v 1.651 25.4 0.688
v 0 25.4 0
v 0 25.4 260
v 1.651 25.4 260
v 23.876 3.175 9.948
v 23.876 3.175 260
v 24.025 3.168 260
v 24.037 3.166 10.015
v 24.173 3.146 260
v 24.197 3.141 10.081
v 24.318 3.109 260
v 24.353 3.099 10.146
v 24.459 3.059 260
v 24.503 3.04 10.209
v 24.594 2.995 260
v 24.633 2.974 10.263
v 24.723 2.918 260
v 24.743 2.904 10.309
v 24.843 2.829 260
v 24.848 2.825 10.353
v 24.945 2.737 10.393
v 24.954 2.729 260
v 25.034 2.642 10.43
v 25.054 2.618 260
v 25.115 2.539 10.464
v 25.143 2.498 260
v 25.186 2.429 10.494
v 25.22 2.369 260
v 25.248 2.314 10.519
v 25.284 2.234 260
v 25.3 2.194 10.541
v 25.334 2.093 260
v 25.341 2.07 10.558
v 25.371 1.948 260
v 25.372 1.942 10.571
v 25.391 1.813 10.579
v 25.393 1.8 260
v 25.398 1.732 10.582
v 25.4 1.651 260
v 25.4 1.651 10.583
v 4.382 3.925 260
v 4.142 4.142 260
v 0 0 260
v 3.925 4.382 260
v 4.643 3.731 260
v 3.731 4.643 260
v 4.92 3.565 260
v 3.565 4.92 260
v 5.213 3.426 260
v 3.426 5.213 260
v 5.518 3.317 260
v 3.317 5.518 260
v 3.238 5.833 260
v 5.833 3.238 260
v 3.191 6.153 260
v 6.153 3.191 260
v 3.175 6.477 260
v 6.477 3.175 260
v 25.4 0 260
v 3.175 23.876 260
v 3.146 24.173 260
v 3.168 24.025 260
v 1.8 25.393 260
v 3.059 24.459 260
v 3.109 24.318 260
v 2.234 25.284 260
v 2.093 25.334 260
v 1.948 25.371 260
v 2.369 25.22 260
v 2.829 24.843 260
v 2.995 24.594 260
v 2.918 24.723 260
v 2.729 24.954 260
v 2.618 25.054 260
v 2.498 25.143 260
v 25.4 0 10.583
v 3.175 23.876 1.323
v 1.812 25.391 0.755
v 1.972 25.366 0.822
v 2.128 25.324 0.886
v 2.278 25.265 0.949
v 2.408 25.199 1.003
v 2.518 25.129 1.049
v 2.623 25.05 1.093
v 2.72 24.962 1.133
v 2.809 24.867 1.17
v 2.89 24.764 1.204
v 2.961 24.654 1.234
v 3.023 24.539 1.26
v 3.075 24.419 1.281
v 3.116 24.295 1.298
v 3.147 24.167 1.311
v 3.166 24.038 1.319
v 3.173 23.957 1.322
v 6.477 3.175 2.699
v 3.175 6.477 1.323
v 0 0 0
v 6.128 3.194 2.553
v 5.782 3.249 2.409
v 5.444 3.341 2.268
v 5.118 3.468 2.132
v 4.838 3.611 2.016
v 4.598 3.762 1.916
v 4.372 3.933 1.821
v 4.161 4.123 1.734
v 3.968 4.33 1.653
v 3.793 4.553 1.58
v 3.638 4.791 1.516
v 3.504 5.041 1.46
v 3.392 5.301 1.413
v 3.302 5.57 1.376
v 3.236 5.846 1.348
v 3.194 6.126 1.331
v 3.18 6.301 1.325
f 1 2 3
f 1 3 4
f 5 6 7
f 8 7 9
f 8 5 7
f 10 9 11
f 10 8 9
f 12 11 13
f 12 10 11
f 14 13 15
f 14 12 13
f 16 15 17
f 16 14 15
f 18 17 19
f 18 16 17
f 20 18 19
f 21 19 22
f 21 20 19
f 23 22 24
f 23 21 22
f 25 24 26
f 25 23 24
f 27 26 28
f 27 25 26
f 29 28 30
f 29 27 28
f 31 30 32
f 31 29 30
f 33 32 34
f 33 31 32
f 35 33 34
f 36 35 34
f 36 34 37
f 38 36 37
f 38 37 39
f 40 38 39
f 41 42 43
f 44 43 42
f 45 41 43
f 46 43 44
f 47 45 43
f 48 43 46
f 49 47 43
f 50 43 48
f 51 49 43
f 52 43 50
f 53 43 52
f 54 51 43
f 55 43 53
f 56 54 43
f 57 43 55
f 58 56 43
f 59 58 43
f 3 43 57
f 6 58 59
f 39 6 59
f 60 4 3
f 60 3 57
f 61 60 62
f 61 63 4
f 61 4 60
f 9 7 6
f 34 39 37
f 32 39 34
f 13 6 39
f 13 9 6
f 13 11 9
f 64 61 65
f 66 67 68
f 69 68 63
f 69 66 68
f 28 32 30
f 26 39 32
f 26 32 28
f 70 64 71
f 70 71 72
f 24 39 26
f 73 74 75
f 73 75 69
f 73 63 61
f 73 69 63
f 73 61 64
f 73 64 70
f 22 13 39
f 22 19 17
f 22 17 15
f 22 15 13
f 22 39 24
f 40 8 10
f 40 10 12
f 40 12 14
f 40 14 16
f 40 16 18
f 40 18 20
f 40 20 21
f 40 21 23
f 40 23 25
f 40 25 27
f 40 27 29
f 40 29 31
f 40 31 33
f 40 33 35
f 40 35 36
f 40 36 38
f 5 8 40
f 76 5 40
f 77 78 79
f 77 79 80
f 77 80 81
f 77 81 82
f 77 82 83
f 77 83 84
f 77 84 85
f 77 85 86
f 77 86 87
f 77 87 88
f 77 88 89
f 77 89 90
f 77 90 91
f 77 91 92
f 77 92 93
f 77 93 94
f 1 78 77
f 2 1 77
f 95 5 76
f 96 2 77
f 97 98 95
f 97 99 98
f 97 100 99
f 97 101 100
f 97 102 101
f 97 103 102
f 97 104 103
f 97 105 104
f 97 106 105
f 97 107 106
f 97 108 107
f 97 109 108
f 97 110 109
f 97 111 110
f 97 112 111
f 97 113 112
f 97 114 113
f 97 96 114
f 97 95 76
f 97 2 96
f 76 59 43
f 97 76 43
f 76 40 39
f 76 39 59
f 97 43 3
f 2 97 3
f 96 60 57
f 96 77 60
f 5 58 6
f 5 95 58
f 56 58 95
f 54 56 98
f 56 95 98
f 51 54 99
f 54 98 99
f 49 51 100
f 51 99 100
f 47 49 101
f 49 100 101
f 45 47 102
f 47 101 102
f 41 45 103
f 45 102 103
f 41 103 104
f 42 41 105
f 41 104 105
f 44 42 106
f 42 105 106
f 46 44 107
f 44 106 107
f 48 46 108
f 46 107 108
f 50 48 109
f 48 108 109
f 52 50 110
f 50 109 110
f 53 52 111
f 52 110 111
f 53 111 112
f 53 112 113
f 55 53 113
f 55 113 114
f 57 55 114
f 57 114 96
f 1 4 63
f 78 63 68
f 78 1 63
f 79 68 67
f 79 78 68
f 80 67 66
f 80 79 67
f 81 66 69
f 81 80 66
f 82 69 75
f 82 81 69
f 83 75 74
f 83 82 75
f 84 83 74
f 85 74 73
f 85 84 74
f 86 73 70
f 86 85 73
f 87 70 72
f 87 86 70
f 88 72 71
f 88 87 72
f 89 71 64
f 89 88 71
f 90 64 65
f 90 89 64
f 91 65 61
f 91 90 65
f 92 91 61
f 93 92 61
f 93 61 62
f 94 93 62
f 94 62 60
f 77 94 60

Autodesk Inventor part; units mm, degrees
ref_plane "Start Plane" through (0, 0, 0) normal (0, 0, 1) x (1, 0, 0)
ref_plane "End Plane" through (0, 0, 260) normal (0, 0, 1) x (1, 0, 0)
sketch "Sketch" plane through (0, 0, 0) normal (0, 0, 1) x (1, 0, 0)
  line L0 (25.4, 0) -> (0, 0)
  line L1 (0, 0) -> (0, 25.4)
  line L2 (0, 25.4) -> (1.651, 25.4)
  line L3 (3.175, 23.876) -> (3.175, 6.477)
  line L4 (6.477, 3.175) -> (23.876, 3.175)
  line L5 (25.4, 1.651) -> (25.4, 0)
  line L6 (0, -11.0414) -> (0, 31.5385) construction
  line L7 (-11.0414, 0) -> (31.5385, 0) construction
  arc A0 (3.175, 6.477) -> (6.477, 3.175) centre (6.477, 6.477) ccw
  arc A1 (3.175, 23.876) -> (1.651, 25.4) centre (1.651, 23.876) ccw
  arc A2 (25.4, 1.651) -> (23.876, 3.175) centre (23.876, 1.651) ccw
  line L8 (0, 40.0545) -> (0, -19.5574) construction
  line L9 (-19.5574, 0) -> (40.0545, 0) construction
  point P0 (3.175, 25.4)
  point P1 (3.175, 3.175)
  point P2 (25.4, 3.175)
  dimension "d0" = 25.4
  dimension "d1" = 25.4
  dimension "d2" = 3.175
  dimension "d3" = 3.175
  dimension "d10" = 0
  dimension "d11" = 0
  dimension "d14" = 3.302
  dimension "d15" = 1.524
extrude "Body" add sketch "Sketch" along normal up to surface (260 mm away) from surface at 0
sketch "Sketch3" plane through (0, 0, 0) normal (0, 0, 1) x (1, 0, 0)
  line L0 (0, 0) -> (10, 0)
ref_plane "Work Plane3" through (0, 0, 0) normal (0, -1, 0) x (1, 0, 0)
ref_plane "Work Plane6" through (0, 1060, 0) normal (0.3846, 0, -0.9231) x (-0.9231, 0, -0.3846)
split "Split3" plane through (0, 1060, 0) removes the side toward (0.3846, 0, -0.9231)
sketch "Sketch4" plane through (0, 0, 0) normal (0, -1, 0) x (1, 0, 0)
  line L0 (-2, 0) -> (12, 0) projected
  line L1 (-2, 260) -> (12, 260) projected
  dimension "d17" = 260
equation "\"d0\" = G_H"
equation "\"d1\" = G_H"
equation "\"d2\" = G_T"
equation "\"d3\" = G_T"
equation "\"d14\" = G_IR"
equation "\"d15\" = G_ER"
equation "\"d4\" = G_L"
equation "\"G_H\" = 25.4"
equation "\"G_T\" = 3.175"
equation "\"G_ER\" = 1.524"
equation "\"G_IR\" = 3.302"
equation "\"G_L\" = d17"
equation "\"ex\" = 0"
equation "\"G_OFFSET_START\" = 0"
equation "\"G_OFFSET_END\" = 0"
equation "\"d13\" = G_OFFSET_END + B_L"
equation "\"B_L\" = 260"
properties part number "AISC - L 1 x 1 x 1/8 - 10.236" material "Steel, Mild"
